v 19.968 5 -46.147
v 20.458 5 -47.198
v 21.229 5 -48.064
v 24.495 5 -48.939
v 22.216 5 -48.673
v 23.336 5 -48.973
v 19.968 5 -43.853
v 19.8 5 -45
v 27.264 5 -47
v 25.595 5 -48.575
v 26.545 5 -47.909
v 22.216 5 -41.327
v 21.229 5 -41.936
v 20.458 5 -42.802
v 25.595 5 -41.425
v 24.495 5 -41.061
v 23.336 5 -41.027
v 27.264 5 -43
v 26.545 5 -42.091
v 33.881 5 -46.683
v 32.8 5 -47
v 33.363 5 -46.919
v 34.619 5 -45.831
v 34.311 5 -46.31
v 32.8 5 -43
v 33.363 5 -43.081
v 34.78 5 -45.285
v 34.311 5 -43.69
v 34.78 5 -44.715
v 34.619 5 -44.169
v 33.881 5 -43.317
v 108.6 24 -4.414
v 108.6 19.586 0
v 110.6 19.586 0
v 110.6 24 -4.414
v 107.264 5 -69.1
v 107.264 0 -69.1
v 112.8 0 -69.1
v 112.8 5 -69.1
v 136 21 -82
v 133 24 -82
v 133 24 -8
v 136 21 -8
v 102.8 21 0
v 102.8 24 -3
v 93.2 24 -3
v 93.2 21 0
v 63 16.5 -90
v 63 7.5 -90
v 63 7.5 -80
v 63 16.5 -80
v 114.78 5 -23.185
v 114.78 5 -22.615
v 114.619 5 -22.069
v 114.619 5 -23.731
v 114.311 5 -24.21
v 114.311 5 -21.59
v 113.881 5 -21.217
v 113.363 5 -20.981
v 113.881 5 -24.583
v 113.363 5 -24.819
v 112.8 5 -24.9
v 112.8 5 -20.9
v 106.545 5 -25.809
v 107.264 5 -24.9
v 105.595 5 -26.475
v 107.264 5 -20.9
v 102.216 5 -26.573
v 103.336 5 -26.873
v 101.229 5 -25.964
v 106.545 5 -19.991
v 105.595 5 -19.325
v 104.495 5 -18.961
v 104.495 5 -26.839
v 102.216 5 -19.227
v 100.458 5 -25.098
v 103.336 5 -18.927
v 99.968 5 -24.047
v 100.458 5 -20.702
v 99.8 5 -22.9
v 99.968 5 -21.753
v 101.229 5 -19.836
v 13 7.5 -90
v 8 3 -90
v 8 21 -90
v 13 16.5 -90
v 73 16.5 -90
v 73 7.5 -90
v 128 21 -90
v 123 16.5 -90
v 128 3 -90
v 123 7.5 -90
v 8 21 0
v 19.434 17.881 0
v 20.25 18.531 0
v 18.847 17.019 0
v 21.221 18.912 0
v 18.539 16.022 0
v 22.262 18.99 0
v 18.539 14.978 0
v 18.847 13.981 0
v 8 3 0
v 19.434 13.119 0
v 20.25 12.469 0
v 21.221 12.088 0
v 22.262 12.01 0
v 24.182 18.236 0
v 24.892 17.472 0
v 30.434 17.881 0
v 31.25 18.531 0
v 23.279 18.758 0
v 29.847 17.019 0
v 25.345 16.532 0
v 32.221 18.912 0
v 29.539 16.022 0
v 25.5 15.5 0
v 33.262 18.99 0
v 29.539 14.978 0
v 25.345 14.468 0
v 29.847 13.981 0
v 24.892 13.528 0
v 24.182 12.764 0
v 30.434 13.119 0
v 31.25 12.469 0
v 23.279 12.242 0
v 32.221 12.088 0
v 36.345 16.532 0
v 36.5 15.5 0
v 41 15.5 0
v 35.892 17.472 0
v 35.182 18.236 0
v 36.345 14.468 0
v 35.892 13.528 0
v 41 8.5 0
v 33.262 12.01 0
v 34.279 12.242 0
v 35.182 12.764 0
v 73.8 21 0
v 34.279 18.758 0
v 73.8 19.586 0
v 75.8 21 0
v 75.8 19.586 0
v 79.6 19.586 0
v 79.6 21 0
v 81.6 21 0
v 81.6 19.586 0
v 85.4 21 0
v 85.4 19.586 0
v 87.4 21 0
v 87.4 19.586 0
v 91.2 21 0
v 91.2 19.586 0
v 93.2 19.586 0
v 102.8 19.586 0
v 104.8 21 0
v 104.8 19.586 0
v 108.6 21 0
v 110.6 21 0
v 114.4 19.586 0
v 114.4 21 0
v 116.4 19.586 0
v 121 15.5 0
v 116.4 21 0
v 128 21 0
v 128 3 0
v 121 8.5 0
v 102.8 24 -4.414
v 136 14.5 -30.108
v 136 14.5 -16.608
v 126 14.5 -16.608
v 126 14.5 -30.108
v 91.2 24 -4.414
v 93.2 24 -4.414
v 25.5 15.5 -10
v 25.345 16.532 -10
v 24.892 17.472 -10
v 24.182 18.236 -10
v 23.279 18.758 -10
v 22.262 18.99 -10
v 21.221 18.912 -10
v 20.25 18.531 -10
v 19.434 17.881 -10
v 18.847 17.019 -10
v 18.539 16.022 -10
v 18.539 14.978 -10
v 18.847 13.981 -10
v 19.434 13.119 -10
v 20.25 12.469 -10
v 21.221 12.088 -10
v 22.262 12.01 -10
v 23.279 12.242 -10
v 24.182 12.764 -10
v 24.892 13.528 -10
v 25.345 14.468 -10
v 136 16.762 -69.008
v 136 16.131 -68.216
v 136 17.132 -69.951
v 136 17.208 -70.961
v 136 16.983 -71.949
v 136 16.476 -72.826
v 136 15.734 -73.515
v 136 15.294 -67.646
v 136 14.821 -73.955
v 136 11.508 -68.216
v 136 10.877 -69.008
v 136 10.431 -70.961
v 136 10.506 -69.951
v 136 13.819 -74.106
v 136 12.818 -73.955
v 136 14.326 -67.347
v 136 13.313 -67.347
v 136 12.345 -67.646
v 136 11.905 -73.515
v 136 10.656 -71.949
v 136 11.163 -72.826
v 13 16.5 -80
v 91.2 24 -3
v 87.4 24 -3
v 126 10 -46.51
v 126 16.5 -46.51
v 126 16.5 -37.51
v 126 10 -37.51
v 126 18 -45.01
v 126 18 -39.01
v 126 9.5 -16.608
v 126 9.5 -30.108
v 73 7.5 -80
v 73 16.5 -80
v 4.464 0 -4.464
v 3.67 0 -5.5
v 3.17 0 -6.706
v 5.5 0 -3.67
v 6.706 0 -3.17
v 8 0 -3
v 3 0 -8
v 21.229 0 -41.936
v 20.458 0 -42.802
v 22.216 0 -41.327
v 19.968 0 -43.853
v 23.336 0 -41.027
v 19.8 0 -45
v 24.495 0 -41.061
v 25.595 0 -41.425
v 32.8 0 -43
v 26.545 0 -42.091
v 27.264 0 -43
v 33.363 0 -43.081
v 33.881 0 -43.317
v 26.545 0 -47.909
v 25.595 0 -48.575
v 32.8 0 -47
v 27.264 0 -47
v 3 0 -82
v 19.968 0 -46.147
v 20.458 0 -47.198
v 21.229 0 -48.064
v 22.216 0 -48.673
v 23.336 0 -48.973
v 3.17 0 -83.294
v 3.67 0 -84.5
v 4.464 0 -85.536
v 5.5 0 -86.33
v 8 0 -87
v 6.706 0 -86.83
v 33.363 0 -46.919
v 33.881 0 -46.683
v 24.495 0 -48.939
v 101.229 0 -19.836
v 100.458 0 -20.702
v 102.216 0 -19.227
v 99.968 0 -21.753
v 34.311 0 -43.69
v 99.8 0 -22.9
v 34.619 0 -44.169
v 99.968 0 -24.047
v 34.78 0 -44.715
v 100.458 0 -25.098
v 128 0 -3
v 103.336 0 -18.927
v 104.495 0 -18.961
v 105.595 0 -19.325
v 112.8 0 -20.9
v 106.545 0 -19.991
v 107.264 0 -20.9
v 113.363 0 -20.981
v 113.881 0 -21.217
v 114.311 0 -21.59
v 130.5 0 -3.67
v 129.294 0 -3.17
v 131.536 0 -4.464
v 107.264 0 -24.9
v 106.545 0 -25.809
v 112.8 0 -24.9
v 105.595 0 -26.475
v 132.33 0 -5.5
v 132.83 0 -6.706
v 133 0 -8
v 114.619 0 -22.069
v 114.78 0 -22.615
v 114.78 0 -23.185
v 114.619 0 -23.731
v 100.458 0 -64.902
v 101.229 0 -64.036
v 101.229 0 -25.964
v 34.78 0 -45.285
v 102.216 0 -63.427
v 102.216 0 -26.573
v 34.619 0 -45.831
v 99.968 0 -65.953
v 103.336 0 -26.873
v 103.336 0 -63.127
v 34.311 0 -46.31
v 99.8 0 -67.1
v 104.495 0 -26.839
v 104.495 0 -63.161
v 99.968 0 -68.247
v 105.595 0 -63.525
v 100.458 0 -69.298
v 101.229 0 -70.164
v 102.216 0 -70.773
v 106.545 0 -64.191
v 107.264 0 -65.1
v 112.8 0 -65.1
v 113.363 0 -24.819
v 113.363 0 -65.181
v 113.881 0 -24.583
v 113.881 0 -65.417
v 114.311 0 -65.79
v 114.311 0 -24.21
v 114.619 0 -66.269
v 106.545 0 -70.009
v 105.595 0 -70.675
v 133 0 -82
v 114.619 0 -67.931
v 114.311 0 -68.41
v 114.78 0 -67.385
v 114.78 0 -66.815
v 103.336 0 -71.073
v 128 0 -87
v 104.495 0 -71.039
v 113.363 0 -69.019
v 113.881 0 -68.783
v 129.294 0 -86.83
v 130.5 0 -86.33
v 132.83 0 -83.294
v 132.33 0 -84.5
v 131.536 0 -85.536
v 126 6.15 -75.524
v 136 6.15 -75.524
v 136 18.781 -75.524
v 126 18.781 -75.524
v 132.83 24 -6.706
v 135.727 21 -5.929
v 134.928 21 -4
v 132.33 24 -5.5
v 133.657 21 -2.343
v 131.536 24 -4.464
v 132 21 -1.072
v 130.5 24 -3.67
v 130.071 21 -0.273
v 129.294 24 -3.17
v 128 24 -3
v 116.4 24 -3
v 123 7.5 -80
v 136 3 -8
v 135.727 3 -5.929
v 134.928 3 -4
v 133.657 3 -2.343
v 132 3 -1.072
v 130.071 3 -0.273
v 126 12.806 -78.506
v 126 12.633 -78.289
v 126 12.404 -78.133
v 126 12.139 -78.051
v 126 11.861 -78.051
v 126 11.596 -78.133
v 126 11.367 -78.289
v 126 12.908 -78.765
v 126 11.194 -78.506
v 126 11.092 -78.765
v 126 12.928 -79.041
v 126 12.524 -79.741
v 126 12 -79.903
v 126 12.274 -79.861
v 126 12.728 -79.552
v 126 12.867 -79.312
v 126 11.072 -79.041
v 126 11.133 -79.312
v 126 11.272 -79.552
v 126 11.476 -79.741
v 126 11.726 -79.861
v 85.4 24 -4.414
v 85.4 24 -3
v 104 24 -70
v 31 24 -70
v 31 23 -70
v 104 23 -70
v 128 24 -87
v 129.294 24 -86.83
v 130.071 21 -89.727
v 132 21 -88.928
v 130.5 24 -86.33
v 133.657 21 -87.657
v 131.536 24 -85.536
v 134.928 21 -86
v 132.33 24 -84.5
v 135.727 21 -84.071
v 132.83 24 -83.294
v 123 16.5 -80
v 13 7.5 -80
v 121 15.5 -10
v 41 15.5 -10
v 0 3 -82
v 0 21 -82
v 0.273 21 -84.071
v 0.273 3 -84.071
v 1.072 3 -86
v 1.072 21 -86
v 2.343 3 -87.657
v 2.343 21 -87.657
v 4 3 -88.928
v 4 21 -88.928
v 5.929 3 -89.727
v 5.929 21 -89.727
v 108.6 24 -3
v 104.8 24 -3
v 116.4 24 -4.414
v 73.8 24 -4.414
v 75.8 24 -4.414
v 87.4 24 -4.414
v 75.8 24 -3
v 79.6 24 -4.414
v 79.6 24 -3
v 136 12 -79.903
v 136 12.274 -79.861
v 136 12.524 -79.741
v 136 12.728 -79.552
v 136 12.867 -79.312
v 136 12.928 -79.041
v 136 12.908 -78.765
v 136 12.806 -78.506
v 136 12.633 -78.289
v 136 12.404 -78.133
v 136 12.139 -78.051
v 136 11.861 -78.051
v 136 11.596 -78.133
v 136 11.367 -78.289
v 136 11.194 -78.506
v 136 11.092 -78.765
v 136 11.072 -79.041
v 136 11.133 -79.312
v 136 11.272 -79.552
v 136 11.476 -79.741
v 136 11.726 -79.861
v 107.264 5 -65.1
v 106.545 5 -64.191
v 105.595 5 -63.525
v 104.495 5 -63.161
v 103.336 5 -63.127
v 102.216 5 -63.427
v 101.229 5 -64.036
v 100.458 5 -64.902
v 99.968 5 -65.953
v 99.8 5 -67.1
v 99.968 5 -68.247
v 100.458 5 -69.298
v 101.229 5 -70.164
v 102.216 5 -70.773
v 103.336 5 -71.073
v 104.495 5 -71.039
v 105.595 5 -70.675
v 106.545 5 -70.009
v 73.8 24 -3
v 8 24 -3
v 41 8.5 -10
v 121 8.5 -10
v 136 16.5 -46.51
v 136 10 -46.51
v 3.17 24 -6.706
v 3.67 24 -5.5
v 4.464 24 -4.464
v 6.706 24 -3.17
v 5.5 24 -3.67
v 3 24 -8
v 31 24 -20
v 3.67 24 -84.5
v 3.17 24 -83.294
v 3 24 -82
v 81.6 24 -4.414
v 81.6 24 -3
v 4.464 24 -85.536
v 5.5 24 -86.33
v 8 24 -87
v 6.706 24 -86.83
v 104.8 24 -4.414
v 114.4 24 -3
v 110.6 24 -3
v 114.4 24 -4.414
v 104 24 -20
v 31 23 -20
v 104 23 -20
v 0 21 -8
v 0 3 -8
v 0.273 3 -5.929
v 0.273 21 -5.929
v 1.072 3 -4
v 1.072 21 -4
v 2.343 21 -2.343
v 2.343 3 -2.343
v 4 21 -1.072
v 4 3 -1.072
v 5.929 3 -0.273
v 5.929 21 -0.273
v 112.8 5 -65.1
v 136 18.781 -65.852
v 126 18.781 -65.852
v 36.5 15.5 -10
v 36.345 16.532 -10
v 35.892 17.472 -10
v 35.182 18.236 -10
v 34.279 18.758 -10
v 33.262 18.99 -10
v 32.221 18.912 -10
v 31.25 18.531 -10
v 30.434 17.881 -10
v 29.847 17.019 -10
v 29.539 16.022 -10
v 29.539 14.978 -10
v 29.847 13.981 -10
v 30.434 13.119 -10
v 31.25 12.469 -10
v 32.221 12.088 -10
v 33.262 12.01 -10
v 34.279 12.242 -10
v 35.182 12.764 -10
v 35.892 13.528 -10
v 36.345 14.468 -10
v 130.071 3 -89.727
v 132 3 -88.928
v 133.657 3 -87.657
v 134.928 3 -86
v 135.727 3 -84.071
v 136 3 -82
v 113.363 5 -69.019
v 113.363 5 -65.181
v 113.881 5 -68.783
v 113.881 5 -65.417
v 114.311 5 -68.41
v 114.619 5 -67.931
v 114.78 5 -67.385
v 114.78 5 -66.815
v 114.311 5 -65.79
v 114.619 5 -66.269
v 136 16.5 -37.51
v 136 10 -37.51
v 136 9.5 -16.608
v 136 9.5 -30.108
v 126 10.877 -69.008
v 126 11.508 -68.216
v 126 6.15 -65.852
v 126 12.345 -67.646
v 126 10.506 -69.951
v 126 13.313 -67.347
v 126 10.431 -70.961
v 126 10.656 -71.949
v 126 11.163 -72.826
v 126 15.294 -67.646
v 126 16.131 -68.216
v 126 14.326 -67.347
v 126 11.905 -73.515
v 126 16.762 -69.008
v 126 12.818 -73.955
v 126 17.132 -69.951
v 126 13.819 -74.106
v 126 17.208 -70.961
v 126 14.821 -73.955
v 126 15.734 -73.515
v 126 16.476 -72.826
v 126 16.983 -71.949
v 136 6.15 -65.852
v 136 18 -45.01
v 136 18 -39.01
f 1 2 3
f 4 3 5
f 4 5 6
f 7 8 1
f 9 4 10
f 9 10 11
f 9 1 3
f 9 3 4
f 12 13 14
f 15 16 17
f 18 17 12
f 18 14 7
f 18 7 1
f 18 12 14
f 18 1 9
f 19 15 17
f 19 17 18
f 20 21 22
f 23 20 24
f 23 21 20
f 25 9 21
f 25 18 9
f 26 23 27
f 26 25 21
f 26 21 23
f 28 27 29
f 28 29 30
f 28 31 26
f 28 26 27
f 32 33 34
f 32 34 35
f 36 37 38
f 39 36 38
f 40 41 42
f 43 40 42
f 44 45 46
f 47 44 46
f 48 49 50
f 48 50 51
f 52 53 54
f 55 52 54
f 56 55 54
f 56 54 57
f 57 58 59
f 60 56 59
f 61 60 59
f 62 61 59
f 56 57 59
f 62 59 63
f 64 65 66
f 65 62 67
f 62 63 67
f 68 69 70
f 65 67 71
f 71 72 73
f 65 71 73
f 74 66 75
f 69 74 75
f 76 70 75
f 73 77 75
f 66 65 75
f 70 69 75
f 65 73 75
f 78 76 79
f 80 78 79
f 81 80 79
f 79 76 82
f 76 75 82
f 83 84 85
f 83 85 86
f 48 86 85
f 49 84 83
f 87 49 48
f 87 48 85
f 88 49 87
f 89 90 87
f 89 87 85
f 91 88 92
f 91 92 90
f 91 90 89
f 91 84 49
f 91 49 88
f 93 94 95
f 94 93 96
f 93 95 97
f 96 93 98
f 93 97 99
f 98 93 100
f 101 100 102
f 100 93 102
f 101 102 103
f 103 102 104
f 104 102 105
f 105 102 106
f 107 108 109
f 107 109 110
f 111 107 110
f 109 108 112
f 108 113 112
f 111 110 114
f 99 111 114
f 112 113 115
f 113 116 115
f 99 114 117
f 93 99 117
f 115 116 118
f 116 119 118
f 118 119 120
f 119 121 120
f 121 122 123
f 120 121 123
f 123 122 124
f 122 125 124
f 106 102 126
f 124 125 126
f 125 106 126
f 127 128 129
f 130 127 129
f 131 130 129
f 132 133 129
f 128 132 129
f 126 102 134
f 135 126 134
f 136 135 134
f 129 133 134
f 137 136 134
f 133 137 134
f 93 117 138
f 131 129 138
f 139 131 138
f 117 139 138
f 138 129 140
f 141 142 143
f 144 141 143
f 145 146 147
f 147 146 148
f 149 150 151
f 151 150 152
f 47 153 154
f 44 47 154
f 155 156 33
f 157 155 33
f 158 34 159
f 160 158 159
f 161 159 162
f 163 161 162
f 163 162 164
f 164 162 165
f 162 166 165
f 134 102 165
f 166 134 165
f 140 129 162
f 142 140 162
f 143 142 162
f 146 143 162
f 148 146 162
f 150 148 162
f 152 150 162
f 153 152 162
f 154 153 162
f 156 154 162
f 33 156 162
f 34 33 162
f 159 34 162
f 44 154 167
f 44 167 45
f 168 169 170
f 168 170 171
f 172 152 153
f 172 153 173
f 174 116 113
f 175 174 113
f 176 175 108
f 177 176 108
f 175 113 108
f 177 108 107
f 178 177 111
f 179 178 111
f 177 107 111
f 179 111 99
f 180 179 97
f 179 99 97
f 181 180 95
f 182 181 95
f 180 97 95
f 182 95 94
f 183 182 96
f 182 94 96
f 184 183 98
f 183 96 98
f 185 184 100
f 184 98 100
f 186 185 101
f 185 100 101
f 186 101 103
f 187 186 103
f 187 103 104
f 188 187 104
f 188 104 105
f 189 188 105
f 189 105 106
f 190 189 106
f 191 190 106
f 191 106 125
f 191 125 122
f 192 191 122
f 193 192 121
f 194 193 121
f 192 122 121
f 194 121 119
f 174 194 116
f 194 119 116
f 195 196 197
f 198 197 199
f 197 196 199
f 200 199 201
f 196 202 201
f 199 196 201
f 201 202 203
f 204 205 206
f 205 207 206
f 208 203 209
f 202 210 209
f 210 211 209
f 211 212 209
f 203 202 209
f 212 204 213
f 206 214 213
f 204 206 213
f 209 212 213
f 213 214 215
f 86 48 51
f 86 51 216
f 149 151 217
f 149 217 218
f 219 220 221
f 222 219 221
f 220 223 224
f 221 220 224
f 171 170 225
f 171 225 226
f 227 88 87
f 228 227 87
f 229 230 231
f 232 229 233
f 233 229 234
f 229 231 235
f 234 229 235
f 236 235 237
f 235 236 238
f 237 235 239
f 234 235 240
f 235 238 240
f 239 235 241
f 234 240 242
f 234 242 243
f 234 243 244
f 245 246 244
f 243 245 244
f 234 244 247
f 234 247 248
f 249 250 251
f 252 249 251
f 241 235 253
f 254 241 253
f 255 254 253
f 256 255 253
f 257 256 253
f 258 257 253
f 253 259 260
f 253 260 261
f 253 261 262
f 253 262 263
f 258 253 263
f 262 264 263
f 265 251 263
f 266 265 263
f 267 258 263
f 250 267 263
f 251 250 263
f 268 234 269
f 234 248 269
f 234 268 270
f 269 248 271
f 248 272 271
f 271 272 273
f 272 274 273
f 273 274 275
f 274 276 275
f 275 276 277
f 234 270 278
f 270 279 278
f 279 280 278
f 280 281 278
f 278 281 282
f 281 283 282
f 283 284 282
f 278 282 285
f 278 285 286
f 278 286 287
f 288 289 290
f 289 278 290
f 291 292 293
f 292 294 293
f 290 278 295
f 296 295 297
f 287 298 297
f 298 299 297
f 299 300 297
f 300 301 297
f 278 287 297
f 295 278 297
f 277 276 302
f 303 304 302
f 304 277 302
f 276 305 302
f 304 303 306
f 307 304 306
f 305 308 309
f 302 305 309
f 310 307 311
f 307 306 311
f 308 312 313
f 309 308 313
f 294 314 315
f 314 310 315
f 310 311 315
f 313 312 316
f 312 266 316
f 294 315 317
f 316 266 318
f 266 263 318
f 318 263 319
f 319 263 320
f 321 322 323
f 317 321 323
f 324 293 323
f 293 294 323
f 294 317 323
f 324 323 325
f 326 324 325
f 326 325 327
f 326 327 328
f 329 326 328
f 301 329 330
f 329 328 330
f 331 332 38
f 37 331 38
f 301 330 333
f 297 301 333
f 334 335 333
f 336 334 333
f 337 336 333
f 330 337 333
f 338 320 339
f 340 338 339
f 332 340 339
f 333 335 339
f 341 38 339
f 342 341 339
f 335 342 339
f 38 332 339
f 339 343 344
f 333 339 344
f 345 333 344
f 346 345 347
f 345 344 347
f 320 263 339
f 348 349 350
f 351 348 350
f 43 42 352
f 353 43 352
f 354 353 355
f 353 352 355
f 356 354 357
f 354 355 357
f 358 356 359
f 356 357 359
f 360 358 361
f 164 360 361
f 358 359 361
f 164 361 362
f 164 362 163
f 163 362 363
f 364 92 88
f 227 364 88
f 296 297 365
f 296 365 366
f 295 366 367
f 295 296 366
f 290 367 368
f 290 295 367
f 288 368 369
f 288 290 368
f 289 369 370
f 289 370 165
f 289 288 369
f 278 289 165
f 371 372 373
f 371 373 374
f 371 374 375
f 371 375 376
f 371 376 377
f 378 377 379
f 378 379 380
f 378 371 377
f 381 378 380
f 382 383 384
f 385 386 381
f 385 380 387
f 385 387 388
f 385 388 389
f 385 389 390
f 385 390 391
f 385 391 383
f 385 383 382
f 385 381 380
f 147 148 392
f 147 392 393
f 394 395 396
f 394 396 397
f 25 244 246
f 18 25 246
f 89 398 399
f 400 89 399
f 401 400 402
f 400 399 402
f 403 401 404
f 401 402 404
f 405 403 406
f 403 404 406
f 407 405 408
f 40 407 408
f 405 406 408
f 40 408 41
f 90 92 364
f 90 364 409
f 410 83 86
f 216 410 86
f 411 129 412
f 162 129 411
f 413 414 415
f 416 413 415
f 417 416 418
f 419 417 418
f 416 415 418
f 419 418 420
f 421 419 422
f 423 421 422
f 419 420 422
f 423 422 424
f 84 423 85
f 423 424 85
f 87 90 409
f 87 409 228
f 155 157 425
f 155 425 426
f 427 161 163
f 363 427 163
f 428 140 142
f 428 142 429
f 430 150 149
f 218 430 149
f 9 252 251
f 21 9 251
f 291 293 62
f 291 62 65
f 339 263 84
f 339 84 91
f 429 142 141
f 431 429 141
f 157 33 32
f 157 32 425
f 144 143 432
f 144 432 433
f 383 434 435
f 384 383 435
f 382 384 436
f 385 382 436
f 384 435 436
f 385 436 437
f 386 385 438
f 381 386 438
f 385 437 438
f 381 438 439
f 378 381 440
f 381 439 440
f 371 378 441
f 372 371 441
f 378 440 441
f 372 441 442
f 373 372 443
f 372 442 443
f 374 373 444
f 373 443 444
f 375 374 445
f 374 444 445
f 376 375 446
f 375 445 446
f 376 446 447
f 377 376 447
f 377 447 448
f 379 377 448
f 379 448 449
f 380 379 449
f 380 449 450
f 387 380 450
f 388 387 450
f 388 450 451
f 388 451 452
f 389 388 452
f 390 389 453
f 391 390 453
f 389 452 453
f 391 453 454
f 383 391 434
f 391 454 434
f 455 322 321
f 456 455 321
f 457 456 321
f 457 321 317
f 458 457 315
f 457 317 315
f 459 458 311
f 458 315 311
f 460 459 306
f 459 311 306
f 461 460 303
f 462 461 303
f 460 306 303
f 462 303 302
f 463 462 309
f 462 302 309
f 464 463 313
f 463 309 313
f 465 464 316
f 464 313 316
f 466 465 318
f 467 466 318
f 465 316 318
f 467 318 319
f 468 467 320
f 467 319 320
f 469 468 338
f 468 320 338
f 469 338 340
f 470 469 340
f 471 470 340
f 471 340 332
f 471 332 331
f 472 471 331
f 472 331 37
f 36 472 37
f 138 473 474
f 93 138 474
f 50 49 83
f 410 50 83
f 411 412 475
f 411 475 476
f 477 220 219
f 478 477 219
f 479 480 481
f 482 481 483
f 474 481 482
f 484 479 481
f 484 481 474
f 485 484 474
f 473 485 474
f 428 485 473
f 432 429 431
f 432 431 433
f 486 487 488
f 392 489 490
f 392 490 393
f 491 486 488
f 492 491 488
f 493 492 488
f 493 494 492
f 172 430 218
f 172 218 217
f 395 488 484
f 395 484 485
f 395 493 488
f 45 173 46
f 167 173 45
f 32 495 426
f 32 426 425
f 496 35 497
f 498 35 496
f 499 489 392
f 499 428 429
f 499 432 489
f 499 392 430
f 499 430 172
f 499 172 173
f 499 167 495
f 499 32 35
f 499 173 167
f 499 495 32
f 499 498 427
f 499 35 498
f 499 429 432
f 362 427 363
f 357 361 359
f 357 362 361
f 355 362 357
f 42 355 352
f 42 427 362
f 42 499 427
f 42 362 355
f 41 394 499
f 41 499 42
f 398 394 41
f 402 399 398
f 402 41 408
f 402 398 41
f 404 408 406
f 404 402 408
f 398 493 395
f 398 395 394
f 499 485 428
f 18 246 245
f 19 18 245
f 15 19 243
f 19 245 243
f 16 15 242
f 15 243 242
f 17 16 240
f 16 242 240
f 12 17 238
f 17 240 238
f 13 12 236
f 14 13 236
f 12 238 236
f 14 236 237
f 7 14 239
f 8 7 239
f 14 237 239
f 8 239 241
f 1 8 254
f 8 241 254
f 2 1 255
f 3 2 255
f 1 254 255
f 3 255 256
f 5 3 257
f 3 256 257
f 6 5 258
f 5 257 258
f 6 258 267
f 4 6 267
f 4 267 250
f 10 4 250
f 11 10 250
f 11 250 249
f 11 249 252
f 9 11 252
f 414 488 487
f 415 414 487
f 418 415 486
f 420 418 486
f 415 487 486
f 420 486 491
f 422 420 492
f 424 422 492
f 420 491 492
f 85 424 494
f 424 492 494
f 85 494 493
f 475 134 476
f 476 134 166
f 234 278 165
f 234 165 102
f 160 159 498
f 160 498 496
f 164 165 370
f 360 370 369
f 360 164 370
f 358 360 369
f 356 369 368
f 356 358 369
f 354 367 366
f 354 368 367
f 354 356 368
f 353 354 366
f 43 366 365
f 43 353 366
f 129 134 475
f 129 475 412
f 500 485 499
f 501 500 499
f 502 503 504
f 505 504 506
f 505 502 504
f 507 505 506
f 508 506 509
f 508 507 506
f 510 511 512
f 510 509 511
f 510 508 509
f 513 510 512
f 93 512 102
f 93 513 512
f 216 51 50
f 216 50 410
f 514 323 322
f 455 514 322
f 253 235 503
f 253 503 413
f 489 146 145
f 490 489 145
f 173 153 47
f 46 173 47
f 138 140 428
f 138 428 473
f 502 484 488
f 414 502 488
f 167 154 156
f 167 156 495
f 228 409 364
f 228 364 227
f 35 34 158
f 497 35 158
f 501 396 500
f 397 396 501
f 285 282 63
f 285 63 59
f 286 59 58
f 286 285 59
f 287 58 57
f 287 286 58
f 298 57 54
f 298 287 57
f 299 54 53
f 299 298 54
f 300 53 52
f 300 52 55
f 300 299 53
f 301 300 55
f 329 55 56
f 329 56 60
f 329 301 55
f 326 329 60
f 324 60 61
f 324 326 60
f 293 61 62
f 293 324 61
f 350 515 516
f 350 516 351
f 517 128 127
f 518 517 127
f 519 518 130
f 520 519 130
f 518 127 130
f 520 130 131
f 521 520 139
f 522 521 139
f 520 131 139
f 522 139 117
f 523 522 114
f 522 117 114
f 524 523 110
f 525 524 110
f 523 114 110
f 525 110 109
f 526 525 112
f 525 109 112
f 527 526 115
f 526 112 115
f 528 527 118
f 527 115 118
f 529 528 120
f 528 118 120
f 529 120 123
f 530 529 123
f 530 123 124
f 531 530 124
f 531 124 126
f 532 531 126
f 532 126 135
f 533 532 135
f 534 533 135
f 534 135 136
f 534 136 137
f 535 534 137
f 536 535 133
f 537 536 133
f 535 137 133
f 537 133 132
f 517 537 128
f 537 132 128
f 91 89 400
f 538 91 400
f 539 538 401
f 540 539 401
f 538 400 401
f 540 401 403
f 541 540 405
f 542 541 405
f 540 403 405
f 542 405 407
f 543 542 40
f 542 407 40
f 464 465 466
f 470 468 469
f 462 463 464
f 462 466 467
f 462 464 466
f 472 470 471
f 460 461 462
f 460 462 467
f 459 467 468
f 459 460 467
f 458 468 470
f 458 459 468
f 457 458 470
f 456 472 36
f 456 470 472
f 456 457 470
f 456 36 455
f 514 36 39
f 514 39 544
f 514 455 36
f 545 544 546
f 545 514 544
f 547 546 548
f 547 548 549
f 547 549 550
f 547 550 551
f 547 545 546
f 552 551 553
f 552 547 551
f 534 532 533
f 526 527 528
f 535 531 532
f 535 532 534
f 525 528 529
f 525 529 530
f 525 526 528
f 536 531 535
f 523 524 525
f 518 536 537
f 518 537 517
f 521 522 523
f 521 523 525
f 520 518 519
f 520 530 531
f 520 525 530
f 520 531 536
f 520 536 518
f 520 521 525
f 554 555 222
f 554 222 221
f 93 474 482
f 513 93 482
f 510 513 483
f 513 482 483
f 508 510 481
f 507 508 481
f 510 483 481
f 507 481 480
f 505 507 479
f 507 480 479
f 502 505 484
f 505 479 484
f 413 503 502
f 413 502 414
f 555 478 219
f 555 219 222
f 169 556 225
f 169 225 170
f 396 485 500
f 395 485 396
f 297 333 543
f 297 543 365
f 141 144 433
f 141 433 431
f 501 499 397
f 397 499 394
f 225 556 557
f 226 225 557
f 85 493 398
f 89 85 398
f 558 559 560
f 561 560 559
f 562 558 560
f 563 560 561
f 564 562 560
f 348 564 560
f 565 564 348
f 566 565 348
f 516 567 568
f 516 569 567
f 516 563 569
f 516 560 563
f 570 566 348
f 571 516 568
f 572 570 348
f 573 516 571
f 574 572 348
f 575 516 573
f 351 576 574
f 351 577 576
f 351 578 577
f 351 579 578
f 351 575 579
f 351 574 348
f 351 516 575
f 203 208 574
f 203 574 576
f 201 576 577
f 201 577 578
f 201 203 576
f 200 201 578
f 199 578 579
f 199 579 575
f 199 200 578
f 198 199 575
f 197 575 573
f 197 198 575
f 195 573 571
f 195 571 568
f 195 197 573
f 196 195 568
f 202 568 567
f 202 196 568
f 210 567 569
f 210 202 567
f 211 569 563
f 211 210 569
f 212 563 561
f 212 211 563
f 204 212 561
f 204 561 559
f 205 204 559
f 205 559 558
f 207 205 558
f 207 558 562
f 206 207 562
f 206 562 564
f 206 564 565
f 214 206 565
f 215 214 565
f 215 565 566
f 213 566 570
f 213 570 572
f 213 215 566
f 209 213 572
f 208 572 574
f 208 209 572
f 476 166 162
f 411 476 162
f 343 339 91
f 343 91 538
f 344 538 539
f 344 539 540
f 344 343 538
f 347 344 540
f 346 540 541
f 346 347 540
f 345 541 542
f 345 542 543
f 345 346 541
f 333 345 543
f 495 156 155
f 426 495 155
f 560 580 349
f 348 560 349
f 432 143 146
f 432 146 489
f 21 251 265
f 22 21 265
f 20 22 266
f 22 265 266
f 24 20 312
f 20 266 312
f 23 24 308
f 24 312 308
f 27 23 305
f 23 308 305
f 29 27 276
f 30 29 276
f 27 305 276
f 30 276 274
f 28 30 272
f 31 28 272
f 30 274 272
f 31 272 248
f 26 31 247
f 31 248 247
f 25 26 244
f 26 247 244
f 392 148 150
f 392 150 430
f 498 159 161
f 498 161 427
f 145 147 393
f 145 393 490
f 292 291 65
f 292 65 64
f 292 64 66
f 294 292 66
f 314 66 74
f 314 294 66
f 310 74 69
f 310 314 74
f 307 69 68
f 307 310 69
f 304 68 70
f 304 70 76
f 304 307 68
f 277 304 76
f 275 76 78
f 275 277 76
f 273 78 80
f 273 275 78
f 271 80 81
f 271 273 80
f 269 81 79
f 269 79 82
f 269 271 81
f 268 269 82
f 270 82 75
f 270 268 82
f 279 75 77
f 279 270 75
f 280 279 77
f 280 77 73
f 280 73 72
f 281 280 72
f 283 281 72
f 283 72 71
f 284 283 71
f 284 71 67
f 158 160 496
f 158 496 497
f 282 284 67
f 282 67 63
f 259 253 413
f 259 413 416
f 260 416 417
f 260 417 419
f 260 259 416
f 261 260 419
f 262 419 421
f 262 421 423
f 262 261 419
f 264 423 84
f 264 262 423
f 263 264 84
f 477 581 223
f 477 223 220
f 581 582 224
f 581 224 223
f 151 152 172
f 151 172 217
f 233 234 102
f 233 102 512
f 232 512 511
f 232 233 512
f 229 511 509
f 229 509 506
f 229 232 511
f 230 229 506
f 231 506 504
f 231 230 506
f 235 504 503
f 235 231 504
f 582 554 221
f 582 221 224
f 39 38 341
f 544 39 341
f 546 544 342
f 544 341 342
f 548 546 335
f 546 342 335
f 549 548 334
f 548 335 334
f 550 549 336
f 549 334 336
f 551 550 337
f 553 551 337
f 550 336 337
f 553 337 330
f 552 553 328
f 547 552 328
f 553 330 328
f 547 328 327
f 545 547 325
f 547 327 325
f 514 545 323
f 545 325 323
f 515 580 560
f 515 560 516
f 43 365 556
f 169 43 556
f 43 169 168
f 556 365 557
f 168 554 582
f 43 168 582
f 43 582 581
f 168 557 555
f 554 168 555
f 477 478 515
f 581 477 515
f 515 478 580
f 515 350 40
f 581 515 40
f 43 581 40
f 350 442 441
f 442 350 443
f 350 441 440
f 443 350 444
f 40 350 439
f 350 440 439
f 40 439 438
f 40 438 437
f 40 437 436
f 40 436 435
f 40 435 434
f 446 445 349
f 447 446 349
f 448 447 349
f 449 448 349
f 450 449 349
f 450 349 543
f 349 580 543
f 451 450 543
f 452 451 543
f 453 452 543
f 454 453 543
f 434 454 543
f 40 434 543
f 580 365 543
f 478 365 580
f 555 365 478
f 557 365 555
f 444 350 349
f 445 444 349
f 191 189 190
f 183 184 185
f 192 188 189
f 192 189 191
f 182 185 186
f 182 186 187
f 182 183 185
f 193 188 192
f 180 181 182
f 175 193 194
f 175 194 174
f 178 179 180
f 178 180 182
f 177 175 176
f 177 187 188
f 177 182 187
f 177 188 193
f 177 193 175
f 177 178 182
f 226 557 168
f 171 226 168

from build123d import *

# Parameters (mm, degrees)
SKETCH1_W           = 136
SKETCH1_H           = 90
BOSS_EXTRUDE1_DEPTH = 24
SKETCH4_R           = 0.930895073
SKETCH4_W           = 13.5
SKETCH4_H           = 5
SKETCH4_W_2         = 9.671745291
SKETCH4_H_2         = 12.631347156
SKETCH4_R_2         = 3.3980858
CUT_EXTRUDE1_DEPTH  = 10
SKETCH3_W           = 50
SKETCH3_H           = 9
CUT_EXTRUDE2_DEPTH  = 10
SKETCH2_R           = 3.5
SKETCH2_W           = 80
SKETCH2_H           = 7
CUT_EXTRUDE3_DEPTH  = 10
FILLET1_R           = 8
CHAMFER1_SIZE       = 3
CUT_EXTRUDE4_DEPTH  = 5
CUT_EXTRUDE5_START  = 73.8
CUT_EXTRUDE5_DEPTH  = 2
LPATTERN1_COUNT     = 8
LPATTERN1_PITCH     = 5.8
SKETCH7_W           = 73
SKETCH7_H           = 50
CUT_EXTRUDE6_DEPTH  = 1


# Read off the part's stored shape, not the designer's step: Cut-Extrude5
with BuildPart() as part:
    # Sketch1 → Boss-Extrude1 (new body)
    with BuildSketch(Plane(origin=(0, 0, 0), x_dir=(1, 0, 0), z_dir=(0, 1, 0))):
        with Locations((68, 45)):
            Rectangle(SKETCH1_W, SKETCH1_H)
    extrude(amount=BOSS_EXTRUDE1_DEPTH)

    # Sketch4 → Cut-Extrude1 (cut)
    # profile 1 of 4: a face of its own
    with BuildSketch(Plane(origin=(136, 0, 0), x_dir=(0, 0, -1), z_dir=(1, 0, 0))):
        with Locations((78.971843902, 12)):
            Circle(SKETCH4_R)
    # profile 2 of 4: a face of its own
    with BuildSketch(Plane(origin=(136, 0, 0), x_dir=(0, 0, -1), z_dir=(1, 0, 0))):
        Polygon((37.51037714, 10), (37.51037714, 16.5), (39.01037714, 18), (45.01037714, 18), (46.51037714, 16.5), (46.51037714, 10), align=None)
    # profile 3 of 4: a face of its own
    with BuildSketch(Plane(origin=(136, 0, 0), x_dir=(0, 0, -1), z_dir=(1, 0, 0))):
        with Locations((23.357700282, 12)):
            Rectangle(SKETCH4_W, SKETCH4_H)
    # profile 4 of 4: a face of its own
    with BuildSketch(Plane(origin=(136, 0, 0), x_dir=(0, 0, -1), z_dir=(1, 0, 0))):
        with Locations((70.687922275, 12.465761788)):
            Rectangle(SKETCH4_W_2, SKETCH4_H_2)
        with Locations((70.707468534, 13.819380659)):
            Circle(SKETCH4_R_2, mode=Mode.SUBTRACT)
    extrude(amount=-CUT_EXTRUDE1_DEPTH, mode=Mode.SUBTRACT)

    # Sketch3 → Cut-Extrude2 (cut)
    with BuildSketch(Plane(origin=(0, 0, -90), x_dir=(-1, 0, 0), z_dir=(0, 0, -1))):
        with Locations((-38, 12)):
            Rectangle(SKETCH3_W, SKETCH3_H)
        with Locations((-98, 12)):
            Rectangle(SKETCH3_W, SKETCH3_H)
    extrude(amount=-CUT_EXTRUDE2_DEPTH, mode=Mode.SUBTRACT)

    # Sketch2 → Cut-Extrude3 (cut)
    with BuildSketch(Plane.XY):
        with Locations((33, 15.5)):
            Circle(SKETCH2_R)
        with Locations((22, 15.5)):
            Circle(SKETCH2_R)
        with Locations((81, 12)):
            Rectangle(SKETCH2_W, SKETCH2_H)
    extrude(amount=-CUT_EXTRUDE3_DEPTH, mode=Mode.SUBTRACT)

    # Fillet1
    fillet1_edges = [part.edges().sort_by_distance(p)[0] for p in [
        (0, 12, -90),
        (136, 12, -90),
        (136, 12, 0),
        (0, 12, 0),
    ]]
    fillet(fillet1_edges, radius=FILLET1_R)

    # Chamfer1
    chamfer1_edges = [part.edges().sort_by_distance(p)[0] for p in [
        (0, 0, -45),
        (0, 24, -45),
        (68, 0, -90),
        (136, 0, -45),
        (68, 0, 0),
        (133.656854249, 0, -87.656854249),
        (133.656854249, 0, -2.343145751),
        (2.343145751, 0, -2.343145751),
        (2.343145751, 0, -87.656854249),
        (68, 24, -90),
        (68, 24, 0),
        (136, 24, -45),
        (133.656854249, 24, -87.656854249),
        (133.656854249, 24, -2.343145751),
        (2.343145751, 24, -2.343145751),
        (2.343145751, 24, -87.656854249),
    ]]
    chamfer(chamfer1_edges, length=CHAMFER1_SIZE)

    # Sketch5 → Cut-Extrude4 (cut)
    with BuildSketch(Plane.XZ):
        with BuildLine():
            Line((32.8, -43), (27.264101615, -43))
            ThreePointArc((27.264101615, -43), (19.8, -45), (27.264101615, -47))
            Line((27.264101615, -47), (32.8, -47))
            ThreePointArc((32.8, -47), (34.8, -45), (32.8, -43))
        make_face()
        with BuildLine():
            Line((112.8, -24.9), (107.264101615, -24.9))
            ThreePointArc((107.264101615, -24.9), (99.8, -22.9), (107.264101615, -20.9))
            Line((107.264101615, -20.9), (112.8, -20.9))
            ThreePointArc((112.8, -20.9), (114.8, -22.9), (112.8, -24.9))
        make_face()
        with BuildLine():
            Line((112.8, -65.1), (107.264101615, -65.1))
            ThreePointArc((107.264101615, -65.1), (99.8, -67.1), (107.264101615, -69.1))
            Line((107.264101615, -69.1), (112.8, -69.1))
            ThreePointArc((112.8, -69.1), (114.8, -67.1), (112.8, -65.1))
        make_face()
    extrude(amount=-CUT_EXTRUDE4_DEPTH, mode=Mode.SUBTRACT)

    # Cut-Extrude5 outline → Cut-Extrude5 (cut)
    with BuildSketch(Plane.YZ.offset(CUT_EXTRUDE5_START)):
        Polygon((21, 0), (19.585786438, 0), (24, -4.414213562), (24, -3), align=None)
    cut_extrude5 = extrude(amount=CUT_EXTRUDE5_DEPTH, mode=Mode.SUBTRACT)

    # LPattern1: Cut-Extrude5 ×8, 1 skipped
    with Locations(*[(i * LPATTERN1_PITCH, 0, 0) for i in range(1, LPATTERN1_COUNT) if i not in (4,)]):
        add(cut_extrude5, mode=Mode.SUBTRACT)

    # Sketch7 → Cut-Extrude6 (cut)
    with BuildSketch(Plane(origin=(0, 24, 0), x_dir=(1, 0, 0), z_dir=(0, 1, 0))):
        with Locations((67.5, 45)):
            Rectangle(SKETCH7_W, SKETCH7_H)
    extrude(amount=-CUT_EXTRUDE6_DEPTH, mode=Mode.SUBTRACT)


solid = part.part
